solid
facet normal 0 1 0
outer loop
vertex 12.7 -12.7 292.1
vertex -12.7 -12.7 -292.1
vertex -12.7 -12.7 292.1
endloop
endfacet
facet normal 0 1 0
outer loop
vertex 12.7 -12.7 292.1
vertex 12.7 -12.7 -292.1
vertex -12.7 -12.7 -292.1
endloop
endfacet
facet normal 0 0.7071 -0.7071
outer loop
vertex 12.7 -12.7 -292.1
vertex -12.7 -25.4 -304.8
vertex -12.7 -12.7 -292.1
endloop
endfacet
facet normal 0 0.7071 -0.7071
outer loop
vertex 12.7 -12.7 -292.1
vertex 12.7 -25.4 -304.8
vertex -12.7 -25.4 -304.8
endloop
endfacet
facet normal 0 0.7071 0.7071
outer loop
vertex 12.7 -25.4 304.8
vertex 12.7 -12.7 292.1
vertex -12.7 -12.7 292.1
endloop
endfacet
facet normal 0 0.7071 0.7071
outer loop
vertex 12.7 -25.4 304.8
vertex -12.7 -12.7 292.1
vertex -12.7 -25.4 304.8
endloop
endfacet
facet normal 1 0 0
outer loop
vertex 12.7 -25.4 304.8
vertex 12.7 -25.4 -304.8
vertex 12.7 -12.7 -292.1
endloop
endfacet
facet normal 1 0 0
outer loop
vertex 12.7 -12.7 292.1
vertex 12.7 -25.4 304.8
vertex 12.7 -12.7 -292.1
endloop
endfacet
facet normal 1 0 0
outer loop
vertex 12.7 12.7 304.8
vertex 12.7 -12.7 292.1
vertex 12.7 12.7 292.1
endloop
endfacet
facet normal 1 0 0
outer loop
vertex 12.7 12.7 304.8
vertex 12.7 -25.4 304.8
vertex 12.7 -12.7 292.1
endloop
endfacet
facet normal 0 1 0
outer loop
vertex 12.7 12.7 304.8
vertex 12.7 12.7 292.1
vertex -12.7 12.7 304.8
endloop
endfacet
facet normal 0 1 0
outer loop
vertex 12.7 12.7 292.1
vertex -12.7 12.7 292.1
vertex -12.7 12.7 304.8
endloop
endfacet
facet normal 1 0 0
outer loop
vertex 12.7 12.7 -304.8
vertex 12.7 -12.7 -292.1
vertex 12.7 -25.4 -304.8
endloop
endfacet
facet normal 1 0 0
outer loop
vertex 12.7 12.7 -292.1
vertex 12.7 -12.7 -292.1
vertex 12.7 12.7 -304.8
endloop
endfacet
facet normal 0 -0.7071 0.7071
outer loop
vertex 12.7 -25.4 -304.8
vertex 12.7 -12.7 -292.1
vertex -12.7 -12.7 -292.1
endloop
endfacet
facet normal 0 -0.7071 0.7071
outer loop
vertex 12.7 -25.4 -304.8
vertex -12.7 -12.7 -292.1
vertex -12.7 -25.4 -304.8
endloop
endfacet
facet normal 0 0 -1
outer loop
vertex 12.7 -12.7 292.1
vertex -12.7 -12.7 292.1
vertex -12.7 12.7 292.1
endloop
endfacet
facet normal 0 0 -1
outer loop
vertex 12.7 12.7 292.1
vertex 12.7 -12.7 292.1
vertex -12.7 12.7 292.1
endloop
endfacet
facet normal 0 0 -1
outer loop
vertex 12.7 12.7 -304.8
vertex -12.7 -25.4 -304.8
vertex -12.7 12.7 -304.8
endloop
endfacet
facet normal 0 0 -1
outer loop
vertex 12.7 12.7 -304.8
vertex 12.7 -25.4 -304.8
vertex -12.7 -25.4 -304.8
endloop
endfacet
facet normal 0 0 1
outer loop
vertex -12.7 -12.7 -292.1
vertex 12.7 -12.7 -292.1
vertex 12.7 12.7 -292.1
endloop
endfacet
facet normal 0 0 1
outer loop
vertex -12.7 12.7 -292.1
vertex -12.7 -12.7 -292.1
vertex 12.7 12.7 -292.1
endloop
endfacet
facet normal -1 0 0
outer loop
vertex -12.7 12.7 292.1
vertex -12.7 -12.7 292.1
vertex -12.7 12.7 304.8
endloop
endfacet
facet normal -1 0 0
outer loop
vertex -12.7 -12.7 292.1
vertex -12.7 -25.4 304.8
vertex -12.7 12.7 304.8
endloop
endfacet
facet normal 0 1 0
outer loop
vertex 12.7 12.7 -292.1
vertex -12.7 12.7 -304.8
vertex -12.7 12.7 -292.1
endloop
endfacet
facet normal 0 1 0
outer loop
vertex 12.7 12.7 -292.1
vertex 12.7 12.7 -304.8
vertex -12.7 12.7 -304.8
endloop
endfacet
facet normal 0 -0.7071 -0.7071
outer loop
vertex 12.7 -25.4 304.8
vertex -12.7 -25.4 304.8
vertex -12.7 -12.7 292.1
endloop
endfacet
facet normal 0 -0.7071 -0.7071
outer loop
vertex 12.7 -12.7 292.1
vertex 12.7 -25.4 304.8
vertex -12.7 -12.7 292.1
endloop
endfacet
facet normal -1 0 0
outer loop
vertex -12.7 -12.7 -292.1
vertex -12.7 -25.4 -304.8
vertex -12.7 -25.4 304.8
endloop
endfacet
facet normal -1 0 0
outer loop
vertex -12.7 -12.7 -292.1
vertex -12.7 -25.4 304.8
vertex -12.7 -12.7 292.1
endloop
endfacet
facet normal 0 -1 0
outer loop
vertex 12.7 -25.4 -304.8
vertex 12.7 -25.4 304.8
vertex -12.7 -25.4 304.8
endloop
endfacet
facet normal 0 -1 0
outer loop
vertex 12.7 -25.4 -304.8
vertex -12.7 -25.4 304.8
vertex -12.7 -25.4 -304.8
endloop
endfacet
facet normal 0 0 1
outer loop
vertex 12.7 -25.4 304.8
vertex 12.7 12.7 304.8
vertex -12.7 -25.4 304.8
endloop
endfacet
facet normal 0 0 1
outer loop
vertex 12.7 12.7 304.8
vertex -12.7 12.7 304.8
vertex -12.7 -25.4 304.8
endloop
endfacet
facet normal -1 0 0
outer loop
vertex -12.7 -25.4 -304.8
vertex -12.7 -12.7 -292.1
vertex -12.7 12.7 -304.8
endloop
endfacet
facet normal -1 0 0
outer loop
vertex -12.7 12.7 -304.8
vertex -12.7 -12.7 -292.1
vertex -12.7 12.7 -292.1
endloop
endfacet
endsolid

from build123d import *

# Parameters (mm, degrees)
F0_W     = 25.4
F0_H     = 12.7
F1_DEPTH = 12.7
F2_DEPTH = 12.7


with BuildPart() as f1:
    # F0 (on Right) → F1 (new body, symmetric)
    with BuildSketch(Plane.YZ):
        with Locations((0, 298.45)):
            Rectangle(F0_W, F0_H)
        Polygon((-25.4, 304.8), (-12.7, 292.1), (-12.7, 304.8), align=None)
        with Locations((0, -298.45)):
            Rectangle(F0_W, F0_H)
        Polygon((-12.7, -304.8), (-12.7, -292.1), (-25.4, -304.8), align=None)
    extrude(amount=F1_DEPTH, both=True)


with BuildPart() as f2:
    # F0 (on Right) → F2 (new body, symmetric)
    with BuildSketch(Plane.YZ):
        Polygon((-12.7, -292.1), (-12.7, 292.1), (-25.4, 304.8), (-25.4, -304.8), align=None)
    extrude(amount=F2_DEPTH, both=True)


solid = Compound([f1.part, f2.part])
